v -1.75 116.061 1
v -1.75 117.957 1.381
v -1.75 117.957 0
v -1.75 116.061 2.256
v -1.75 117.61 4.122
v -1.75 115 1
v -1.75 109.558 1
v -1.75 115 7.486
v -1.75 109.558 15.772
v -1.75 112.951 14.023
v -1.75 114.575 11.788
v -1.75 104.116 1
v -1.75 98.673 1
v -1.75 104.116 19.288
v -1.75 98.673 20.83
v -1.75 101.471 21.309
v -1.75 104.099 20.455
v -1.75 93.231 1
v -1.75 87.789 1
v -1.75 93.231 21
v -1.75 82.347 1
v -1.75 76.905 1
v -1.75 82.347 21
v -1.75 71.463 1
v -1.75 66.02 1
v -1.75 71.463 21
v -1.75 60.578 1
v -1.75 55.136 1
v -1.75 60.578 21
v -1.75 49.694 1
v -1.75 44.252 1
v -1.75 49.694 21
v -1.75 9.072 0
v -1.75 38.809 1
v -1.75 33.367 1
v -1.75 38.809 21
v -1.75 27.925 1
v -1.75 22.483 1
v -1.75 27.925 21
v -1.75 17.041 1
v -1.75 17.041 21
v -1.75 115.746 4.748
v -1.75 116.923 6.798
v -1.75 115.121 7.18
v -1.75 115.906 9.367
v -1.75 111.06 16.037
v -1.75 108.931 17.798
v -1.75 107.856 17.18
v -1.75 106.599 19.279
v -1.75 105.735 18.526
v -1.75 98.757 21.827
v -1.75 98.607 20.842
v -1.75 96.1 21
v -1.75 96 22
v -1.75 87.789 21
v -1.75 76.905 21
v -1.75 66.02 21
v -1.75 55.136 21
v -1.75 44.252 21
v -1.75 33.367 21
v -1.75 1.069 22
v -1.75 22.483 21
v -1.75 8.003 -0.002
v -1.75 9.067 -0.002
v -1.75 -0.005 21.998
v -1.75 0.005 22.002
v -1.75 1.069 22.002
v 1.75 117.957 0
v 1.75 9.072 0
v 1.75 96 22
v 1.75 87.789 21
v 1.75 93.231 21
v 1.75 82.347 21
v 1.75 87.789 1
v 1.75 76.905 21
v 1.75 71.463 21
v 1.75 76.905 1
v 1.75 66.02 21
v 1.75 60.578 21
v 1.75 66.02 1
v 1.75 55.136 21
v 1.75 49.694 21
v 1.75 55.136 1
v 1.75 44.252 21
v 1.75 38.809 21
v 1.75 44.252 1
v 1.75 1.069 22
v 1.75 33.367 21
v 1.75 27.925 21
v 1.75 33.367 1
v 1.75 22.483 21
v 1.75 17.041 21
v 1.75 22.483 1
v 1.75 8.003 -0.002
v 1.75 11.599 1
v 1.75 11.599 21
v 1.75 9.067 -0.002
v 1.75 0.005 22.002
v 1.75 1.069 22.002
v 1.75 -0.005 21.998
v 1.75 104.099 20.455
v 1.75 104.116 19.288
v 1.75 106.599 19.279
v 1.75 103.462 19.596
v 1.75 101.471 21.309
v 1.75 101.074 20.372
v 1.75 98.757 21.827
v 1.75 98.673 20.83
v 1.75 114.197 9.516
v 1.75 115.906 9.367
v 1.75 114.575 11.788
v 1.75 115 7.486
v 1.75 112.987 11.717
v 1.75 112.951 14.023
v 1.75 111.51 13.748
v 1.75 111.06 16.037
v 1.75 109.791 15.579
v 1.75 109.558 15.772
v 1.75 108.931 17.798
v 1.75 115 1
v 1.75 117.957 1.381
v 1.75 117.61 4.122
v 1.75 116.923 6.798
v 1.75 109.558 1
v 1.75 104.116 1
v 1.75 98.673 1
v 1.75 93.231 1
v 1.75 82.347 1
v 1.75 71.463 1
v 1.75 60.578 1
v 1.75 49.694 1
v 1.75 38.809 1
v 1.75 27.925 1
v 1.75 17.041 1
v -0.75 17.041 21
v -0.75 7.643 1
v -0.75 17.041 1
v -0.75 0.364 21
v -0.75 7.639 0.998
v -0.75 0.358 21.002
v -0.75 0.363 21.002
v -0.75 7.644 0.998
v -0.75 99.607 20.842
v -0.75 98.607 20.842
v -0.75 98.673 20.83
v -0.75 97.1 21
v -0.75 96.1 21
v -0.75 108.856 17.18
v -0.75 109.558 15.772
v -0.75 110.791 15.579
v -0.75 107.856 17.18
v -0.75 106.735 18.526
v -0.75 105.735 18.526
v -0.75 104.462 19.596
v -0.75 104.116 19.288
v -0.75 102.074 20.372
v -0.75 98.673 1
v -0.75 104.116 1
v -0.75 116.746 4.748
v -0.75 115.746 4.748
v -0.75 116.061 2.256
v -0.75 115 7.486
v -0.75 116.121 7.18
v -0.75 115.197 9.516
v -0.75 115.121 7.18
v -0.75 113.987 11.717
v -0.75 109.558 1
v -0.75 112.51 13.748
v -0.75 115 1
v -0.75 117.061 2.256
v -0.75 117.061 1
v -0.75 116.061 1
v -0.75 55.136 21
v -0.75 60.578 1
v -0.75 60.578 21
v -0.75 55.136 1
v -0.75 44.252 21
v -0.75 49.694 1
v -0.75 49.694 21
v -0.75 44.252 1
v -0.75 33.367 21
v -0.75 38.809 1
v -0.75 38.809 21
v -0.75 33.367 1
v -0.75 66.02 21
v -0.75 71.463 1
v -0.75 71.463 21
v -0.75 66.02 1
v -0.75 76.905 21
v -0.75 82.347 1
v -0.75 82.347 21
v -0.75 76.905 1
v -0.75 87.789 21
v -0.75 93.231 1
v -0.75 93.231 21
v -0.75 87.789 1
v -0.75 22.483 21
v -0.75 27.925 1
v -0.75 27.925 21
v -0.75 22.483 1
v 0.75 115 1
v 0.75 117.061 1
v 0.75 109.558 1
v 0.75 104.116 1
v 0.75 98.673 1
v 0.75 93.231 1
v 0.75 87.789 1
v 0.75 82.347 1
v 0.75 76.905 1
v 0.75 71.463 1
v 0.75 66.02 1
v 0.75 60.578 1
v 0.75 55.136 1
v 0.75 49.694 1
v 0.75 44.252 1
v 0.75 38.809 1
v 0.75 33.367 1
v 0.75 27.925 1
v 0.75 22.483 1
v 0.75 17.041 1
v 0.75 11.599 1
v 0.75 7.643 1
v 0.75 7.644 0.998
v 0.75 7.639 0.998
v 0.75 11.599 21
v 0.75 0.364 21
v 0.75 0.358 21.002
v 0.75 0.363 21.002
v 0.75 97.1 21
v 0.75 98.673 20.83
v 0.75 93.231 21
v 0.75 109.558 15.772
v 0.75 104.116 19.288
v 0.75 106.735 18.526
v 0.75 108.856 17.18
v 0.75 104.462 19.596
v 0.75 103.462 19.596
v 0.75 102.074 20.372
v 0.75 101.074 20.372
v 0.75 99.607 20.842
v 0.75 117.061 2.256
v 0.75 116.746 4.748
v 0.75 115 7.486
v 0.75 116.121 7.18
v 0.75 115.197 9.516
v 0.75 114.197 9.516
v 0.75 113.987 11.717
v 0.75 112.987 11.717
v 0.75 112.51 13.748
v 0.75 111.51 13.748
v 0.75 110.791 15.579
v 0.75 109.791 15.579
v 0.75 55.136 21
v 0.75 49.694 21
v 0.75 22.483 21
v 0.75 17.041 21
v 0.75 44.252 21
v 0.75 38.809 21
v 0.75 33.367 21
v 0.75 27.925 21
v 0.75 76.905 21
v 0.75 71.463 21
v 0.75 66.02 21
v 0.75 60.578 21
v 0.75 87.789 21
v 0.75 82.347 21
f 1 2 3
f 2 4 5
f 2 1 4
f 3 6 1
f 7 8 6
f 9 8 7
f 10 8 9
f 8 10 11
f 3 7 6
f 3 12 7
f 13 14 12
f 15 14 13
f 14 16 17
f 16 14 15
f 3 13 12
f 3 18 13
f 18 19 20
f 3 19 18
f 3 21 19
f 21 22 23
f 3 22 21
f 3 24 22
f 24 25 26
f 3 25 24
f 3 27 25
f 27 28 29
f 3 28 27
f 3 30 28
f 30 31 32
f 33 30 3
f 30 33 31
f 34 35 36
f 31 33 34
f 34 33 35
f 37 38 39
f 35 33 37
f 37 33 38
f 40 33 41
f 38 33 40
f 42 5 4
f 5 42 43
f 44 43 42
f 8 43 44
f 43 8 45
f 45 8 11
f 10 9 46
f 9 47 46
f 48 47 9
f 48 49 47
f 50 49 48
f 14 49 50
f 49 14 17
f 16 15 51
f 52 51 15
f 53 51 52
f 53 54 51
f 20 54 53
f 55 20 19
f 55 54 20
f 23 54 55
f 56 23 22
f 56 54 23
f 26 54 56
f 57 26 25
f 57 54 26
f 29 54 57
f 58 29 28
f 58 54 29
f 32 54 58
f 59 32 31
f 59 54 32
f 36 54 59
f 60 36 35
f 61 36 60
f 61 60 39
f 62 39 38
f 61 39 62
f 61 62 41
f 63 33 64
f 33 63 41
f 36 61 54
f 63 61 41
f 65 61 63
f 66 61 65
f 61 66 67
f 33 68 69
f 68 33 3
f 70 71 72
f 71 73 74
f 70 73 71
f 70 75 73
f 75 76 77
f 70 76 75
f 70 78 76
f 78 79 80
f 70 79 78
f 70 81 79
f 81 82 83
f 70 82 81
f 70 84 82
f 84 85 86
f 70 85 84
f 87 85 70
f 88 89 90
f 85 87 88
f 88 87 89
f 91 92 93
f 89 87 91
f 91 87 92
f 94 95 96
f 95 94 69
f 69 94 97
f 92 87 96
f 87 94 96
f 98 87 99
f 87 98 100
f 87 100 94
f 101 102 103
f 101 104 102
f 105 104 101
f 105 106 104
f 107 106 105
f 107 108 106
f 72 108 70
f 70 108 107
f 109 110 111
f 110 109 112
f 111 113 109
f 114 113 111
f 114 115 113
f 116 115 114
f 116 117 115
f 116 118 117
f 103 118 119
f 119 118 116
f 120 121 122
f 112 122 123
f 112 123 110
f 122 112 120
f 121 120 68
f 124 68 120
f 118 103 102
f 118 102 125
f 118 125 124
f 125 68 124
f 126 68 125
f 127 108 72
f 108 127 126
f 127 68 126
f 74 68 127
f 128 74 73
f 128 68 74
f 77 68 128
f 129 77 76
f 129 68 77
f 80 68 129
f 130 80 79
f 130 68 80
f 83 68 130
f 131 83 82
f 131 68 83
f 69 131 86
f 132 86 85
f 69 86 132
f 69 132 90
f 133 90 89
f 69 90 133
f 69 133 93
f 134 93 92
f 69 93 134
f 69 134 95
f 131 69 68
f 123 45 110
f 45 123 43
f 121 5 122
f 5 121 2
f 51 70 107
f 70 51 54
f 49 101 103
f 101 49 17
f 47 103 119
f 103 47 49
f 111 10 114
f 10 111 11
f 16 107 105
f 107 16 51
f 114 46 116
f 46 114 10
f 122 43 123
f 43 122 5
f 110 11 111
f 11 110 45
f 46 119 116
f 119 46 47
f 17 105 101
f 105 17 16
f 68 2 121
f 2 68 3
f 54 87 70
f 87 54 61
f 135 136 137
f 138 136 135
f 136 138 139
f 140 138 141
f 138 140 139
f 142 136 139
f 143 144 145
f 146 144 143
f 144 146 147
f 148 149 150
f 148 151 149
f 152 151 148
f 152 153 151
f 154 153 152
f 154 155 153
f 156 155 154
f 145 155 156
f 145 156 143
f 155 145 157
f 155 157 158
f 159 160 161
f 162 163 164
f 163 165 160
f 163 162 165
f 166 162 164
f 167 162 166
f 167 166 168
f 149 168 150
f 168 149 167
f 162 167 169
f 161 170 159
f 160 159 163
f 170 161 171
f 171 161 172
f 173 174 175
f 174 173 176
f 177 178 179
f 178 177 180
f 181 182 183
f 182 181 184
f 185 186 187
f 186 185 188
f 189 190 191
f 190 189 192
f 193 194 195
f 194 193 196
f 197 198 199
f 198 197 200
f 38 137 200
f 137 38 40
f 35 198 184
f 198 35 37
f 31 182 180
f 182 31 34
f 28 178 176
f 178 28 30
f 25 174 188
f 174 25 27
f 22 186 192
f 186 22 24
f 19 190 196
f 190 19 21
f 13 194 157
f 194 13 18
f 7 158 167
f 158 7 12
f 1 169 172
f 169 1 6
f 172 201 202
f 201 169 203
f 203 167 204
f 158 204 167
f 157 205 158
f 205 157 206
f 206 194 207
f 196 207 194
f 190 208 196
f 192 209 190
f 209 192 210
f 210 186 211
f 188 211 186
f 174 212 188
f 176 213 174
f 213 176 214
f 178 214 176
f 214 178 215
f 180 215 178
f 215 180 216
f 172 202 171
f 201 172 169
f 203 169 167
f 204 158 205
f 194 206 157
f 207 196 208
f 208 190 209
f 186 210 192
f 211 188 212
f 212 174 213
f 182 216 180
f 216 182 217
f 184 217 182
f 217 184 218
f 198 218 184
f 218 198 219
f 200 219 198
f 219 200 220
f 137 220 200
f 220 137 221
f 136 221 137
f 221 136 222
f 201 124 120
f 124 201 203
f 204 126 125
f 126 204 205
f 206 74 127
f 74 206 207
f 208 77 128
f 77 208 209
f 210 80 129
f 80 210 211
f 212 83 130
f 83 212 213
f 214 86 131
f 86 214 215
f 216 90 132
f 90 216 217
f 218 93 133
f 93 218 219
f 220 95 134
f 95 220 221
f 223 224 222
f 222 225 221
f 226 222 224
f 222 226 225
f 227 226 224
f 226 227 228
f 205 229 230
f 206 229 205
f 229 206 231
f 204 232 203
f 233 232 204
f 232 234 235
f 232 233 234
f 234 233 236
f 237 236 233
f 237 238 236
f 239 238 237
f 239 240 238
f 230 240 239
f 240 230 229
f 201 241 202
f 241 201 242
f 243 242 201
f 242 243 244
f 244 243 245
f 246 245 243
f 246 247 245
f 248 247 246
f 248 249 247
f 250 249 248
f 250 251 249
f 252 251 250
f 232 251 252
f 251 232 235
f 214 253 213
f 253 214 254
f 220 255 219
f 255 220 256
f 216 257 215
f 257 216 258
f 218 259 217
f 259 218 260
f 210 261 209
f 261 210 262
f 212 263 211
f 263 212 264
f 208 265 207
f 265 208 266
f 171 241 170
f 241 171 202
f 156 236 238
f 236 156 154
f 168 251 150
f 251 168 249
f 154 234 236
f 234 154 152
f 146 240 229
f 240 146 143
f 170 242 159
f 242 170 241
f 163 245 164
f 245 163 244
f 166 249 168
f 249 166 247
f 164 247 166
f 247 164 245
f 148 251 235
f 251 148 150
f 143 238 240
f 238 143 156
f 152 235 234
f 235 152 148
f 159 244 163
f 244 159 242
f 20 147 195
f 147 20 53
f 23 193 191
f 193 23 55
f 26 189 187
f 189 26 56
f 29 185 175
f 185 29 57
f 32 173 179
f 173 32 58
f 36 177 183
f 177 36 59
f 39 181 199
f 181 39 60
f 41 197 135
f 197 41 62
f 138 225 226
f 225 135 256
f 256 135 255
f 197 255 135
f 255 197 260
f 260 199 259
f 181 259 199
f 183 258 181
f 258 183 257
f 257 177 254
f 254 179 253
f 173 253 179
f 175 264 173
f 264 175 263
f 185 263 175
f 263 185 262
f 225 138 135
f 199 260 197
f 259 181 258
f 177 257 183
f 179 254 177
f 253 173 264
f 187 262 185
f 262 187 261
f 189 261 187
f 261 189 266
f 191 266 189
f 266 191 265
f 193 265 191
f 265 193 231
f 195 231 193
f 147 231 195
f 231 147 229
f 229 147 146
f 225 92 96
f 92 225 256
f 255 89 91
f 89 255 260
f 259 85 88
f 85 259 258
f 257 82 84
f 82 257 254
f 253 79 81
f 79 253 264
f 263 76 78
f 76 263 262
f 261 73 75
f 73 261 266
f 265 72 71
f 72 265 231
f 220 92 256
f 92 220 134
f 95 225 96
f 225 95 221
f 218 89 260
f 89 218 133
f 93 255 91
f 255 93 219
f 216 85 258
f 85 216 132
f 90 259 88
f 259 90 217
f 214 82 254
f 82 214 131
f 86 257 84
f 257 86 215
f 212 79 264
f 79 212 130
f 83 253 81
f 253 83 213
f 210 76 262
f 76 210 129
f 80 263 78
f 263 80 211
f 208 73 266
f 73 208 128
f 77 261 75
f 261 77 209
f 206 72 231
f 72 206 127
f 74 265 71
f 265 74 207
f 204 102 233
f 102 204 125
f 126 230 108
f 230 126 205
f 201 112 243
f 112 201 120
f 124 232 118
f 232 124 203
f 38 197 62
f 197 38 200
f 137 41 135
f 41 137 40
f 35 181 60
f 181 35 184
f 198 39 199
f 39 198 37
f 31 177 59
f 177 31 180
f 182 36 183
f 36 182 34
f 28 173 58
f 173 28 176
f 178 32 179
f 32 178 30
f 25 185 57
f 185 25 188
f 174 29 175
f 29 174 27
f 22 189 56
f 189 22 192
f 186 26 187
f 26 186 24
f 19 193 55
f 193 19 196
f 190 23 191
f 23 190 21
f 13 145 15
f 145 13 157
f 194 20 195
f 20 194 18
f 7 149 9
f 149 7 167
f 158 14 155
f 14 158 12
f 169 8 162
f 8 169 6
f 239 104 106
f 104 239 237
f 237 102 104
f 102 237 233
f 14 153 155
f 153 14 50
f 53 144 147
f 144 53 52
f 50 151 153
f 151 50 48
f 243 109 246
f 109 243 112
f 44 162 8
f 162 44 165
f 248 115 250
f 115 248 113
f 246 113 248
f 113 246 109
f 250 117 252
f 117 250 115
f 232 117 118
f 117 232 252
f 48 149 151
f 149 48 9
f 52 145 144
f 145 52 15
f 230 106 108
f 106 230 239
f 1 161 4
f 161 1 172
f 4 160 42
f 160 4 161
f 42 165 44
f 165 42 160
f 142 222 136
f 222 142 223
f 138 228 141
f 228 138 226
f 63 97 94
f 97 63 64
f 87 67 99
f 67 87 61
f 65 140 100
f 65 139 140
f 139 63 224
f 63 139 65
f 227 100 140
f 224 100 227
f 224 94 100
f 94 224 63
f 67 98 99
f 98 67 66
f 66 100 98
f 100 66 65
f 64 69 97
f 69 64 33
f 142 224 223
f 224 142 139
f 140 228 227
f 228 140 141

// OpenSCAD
// parametric knife sheath
// original by Steve Pendergrast (vorpal)
// https://www.thingiverse.com/thing:125109
//
// remix v4 by BikeCyclist: Bugfix for better walls with windows at high grip cutoff angles
// remix v3 by BikeCyclist: Bugfix (windows in thick walls) as suggested by Laurie, improved use of thingiverse customizer interface, better walls with windows at high grip cutoff angles
// remix v2 by BikeCyclist: Parametric wall thickness, shorter ridges, better symmetry
// remix v1 by BikeCyclist: Introducing holding ridge and oblique cut-off at grip
// https://www.thingiverse.com/thing:2856699

// length: the length of the blade from handle to tip
// maxwidth: the maximum width of the blade
// tipwidth:  the width near the tip, zero means it comes to a point
// thickness: maximum thickness of the blade
// has_windows:  0 = do not put in windows to show the blade and simplify cleaning
// has_ridges: 0 = do not add ridges to the sheath to hold the knife by friction
// grip_cutoff_angle:  the angle of the mouth of the sheet at the grip (off the vertical)
//
// all measurements are in mm

//CUSTOMIZER VARIABLES

//	Knife length, mm
knife_length = 115;	//	[25:350]

//	Knife Max Blade width, mm
knife_width = 18;	//	[10:100]

//	Knife thickness, mm
knife_thickness = 1.5;

//	Wall thickness, mm
wall_thickness = 0.5;

// Show knife through windows?
has_windows = 1; // [0:No, 1:Yes]

// Number of windows per side
number_of_windows = 10; // [1:25]

// Sheath has ridges to hold the knife more securely?
has_ridges = 0; // [0:No, 1:Yes]

// Angle of the sheath at the grip (0 = vertical) [0:75]
grip_cutoff_angle = 20;

//CUSTOMIZER VARIABLES END

$fn = 50*1;  // while debugging reduce this to 20 to save time

wall = 2*wall_thickness;
pad = 2*1;

translate ([0, 0, knife_width + 2 * wall + pad])
    rotate ([0, 180, 0])
        parasheath (length = knife_length, maxwidth = knife_width, thickness = knife_thickness, windows = has_windows);


module parasheath(length=200, maxwidth=25, thickness=2, windows=1) {

    difference() {

        union () {

            difference() {

                // first make an oversized blade, oversized by 2 times the wall thickness
                blade(len = length + wall + pad, maxwid = maxwidth + pad + 2 * wall, thick = thickness + 2 * wall);

                translate([0, 0, wall]) 
                    blade(len = length + 0.1 + pad, maxwid = maxwidth + pad, thick = thickness);

            }
            
            if (has_ridges)
            for (i = [-1, 1])
                translate([0, 0, wall + knife_width/2 + pad/2]) 
                    translate ([i * knife_thickness/2, 0, 0])
                        rotate ([-90, 0, 0])
                            scale ([1, 2, 1])
                                cylinder (d = knife_thickness / 2, h = length/8);
            
        }
        
        if (windows)
            intersection ()
            {
                {
                    straight_length = length - maxwidth * sin (grip_cutoff_angle);
                    for (j = [-1, 1])
                        for (i = [1 : number_of_windows])
                            translate([j * (wall + thickness), maxwidth * sin (grip_cutoff_angle) + straight_length/number_of_windows * i + straight_length/(4 * number_of_windows) * j, maxwidth/2 + wall + pad/2]) 
                                    cube([2 * (wall + thickness), straight_length/(2 * number_of_windows), maxwidth + pad], center = true);
                }
                
                translate([0, 0, wall]) 
                    blade(len = length + 0.1 + pad - wall, maxwid = maxwidth + pad, thick = 2 * thickness + 4 * wall);
            }

        rotate ([-grip_cutoff_angle, 0, 0])
            translate([0, -100, 0])
                    cube([200,200,200], center=true);
    }
    
    /* Ensure windows don't cut through the mouth edges of the sheath */
    if (windows)
        difference ()
        {
            maxwid = maxwidth + pad + 2 * wall;
            
            hull ()
            {
                rotate ([-grip_cutoff_angle, 0, 0])
                    translate([0, 0, 0.5 * maxwid / cos (grip_cutoff_angle)])
                        cube ([thickness + 2 * wall, 0.01, maxwid / cos (grip_cutoff_angle)], center = true);
                
                translate([0, wall / cos (grip_cutoff_angle), 0])
                    rotate ([-grip_cutoff_angle, 0, 0])
                        translate([0, 0, 0.5 * maxwid / cos (grip_cutoff_angle)])
                            cube ([thickness + 2 * wall, 0.01, maxwid / cos (grip_cutoff_angle)], center = true);
            }
            
            hull ()
            {
                translate([0, -wall / cos (grip_cutoff_angle), 0])
                    rotate ([-grip_cutoff_angle, 0, 0])
                        translate([0, 0, 0.5 * maxwid / cos (grip_cutoff_angle)])
                            cube ([thickness, 0.01, (maxwidth + pad) / cos (grip_cutoff_angle)], center = true);
                
                translate([0, 2 * wall / cos (grip_cutoff_angle), 0])
                    rotate ([-grip_cutoff_angle, 0, 0])
                        translate([0, 0, 0.5 * maxwid / cos (grip_cutoff_angle)])
                            cube ([thickness, 0.01, (maxwidth + pad) / cos (grip_cutoff_angle)], center = true);
            }
        }
}

module blade (len = 200, maxwid = 25, tipwid = 5, thick = 2) 
{
    translate ([-thick/2, 0, 0])
        union() {
            intersection() {
                    // first make a cube
                    cube([thick, len, maxwid]);
        
                    translate([0,len-maxwid,maxwid]) 
                        rotate([0,90,0]) 
                            cylinder(r=maxwid,h=thick*3,center=true);
            }

            cube([thick,len-maxwid,maxwid]);
        }
}
